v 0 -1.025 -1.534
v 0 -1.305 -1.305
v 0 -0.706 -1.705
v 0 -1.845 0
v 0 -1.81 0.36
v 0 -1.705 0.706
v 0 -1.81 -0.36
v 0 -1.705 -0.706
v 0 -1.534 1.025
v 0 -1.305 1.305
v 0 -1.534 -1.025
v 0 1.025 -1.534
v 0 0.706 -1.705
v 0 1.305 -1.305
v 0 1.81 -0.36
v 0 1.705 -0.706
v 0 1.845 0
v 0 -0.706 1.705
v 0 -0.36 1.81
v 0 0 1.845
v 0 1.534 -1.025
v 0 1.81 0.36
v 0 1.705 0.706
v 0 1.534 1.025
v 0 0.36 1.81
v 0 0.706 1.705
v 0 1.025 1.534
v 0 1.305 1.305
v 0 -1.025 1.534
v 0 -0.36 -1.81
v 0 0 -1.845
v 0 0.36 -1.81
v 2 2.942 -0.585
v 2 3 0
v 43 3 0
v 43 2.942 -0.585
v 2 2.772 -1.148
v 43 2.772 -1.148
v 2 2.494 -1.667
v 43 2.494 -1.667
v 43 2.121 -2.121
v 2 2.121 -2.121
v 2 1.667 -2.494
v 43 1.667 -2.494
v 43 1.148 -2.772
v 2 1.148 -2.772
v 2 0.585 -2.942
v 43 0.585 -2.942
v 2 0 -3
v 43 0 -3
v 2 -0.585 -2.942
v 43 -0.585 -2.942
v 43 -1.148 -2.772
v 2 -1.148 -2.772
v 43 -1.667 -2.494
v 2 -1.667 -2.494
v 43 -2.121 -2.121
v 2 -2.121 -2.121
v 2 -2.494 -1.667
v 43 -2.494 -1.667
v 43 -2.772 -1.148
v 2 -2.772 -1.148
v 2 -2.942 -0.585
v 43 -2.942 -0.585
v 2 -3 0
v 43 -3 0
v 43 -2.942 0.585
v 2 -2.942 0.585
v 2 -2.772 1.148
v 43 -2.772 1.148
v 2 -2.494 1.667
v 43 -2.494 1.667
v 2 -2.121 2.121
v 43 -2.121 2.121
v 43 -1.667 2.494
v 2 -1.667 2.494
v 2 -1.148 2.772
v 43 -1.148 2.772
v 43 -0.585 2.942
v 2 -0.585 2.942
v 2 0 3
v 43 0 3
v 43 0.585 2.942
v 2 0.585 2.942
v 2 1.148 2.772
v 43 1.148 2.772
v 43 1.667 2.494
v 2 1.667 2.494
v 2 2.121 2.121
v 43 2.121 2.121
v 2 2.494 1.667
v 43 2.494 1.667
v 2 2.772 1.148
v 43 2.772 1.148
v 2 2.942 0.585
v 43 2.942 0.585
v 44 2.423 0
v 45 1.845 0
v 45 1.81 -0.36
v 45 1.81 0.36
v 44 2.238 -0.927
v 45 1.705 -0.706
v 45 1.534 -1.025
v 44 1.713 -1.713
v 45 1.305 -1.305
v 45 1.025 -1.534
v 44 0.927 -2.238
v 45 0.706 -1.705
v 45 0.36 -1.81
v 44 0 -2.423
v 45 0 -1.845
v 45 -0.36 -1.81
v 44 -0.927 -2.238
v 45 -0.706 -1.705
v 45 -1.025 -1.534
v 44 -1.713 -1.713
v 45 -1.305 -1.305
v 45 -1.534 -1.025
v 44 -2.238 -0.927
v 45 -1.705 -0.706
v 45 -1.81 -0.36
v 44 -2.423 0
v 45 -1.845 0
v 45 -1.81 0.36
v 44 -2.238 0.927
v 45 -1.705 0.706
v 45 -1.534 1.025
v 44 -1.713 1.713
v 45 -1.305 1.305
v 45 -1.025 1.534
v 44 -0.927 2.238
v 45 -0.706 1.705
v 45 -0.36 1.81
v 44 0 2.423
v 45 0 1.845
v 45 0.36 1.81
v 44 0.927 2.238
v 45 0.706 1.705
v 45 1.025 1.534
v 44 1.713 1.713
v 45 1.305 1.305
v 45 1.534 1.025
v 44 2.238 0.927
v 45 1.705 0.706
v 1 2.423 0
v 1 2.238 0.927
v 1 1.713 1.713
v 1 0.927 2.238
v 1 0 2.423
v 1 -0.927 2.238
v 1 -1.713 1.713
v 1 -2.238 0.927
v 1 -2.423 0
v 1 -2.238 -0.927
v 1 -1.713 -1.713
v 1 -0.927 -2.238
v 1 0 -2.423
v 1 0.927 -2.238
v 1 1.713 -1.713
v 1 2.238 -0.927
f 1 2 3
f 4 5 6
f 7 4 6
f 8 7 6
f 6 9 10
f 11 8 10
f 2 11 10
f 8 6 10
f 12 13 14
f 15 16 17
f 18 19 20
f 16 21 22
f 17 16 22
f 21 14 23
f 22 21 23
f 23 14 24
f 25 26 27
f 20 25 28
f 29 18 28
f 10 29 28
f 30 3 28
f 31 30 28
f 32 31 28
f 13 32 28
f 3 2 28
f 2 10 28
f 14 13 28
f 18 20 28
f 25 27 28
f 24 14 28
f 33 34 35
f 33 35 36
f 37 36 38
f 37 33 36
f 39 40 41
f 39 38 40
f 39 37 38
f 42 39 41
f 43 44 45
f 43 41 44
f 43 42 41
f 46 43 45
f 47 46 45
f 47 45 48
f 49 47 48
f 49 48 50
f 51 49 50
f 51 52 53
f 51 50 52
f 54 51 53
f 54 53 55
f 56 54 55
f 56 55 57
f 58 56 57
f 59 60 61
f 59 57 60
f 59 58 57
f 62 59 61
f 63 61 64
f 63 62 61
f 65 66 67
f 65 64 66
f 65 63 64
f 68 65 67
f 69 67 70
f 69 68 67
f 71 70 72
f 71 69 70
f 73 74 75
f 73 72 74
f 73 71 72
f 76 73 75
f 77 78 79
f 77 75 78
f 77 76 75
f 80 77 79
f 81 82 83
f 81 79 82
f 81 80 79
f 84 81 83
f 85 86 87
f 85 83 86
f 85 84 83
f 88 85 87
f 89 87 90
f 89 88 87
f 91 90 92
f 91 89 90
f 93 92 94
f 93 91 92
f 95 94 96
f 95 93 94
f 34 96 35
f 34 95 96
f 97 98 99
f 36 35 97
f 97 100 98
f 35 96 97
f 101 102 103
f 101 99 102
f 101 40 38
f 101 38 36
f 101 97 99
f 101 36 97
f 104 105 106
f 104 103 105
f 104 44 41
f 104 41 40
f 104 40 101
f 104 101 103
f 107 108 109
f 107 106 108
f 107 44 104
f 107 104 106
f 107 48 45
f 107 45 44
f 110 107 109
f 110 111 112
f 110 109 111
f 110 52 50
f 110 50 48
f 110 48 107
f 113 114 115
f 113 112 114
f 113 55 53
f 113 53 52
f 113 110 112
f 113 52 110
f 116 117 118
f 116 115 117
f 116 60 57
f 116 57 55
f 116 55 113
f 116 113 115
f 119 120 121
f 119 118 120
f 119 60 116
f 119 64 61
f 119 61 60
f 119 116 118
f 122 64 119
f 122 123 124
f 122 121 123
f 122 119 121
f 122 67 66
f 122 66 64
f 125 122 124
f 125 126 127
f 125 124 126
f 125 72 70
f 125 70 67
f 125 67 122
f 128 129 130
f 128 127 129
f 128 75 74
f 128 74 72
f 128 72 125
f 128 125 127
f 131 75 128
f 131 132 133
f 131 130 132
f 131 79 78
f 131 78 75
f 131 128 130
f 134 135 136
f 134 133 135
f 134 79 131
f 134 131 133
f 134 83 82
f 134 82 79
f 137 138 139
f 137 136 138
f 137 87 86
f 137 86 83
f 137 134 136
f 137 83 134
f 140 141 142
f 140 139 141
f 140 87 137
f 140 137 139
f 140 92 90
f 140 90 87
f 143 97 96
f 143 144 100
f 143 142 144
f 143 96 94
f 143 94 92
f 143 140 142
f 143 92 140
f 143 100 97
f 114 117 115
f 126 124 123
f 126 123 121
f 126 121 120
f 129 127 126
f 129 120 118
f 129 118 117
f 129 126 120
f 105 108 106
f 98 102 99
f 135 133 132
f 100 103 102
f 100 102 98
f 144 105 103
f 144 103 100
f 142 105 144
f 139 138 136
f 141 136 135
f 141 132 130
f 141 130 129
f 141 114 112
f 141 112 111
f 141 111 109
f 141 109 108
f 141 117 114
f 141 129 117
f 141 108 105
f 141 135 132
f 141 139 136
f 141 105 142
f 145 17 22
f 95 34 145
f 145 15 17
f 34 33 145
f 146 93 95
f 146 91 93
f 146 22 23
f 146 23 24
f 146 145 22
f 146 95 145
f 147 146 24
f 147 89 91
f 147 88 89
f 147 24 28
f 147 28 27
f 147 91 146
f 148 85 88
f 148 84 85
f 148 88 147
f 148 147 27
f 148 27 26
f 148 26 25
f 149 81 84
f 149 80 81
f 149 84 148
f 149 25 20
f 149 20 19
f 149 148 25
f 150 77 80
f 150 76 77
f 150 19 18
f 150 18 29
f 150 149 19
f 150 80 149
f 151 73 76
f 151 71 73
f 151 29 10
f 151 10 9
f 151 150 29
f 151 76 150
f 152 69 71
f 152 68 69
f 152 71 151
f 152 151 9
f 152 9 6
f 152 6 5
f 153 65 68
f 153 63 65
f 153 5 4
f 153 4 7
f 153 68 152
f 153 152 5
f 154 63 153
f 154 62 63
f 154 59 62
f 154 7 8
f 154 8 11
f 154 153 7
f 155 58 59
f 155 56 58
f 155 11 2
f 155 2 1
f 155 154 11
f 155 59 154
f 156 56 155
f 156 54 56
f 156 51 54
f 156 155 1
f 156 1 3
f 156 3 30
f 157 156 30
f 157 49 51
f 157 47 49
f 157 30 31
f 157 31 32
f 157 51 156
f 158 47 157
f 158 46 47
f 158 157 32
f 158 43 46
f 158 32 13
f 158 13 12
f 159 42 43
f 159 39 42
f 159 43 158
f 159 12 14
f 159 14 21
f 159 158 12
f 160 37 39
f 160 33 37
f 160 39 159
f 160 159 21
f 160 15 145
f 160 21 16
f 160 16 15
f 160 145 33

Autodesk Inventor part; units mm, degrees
ref_plane "YZ Plane" through (0, 0, 0) normal (1, 0, 0) x (0, 1, 0)
ref_plane "XZ Plane" through (0, 0, 0) normal (0, 1, 0) x (-1, 0, 0)
ref_plane "XY Plane" through (0, 0, 0) normal (0, 0, 1) x (1, 0, 0)
sketch "Эскиз" plane through (0, 0, 0) normal (1, 0, 0) x (0, 1, 0)
  circle A0 centre (0, 0) radius 3
  dimension "d1" = 6
extrude "Базовый элемент" add sketch "Эскиз" along normal blind 45
chamfer "Фаска1" distance 2 angle 30 1 edges at (0, -3, 0) measured on face at (15, 2.9612, -0.4812)
chamfer "Эскиз2" distance 2 angle 30 1 edges at (45, -3, 0) measured on face at (30.6667, 2.9903, -0.2414)
equation "\"d1\" = NND"
equation "\"d2\" = NLG"
equation "\"d8\" = PHH"
equation "\"d9\" = FAWI"
equation "\"d12\" = PHH"
equation "\"d4\" = PHH"
equation "\"d5\" = FAWI"
equation "\"d11\" = PHH"
equation "\"NND\" = 6"
equation "\"NLG\" = 45"
equation "\"PHH\" = 2"
equation "\"FAWI\" = 30deg"
equation "\"DIST1\" = 3.2"
equation "\"DIST2\" = DIST1"
equation "\"BOR1\" = 1.6"
equation "\"FAWI2\" = 30deg"
equation "\"BOR2\" = BOR1"
equation "\"PHH2\" = PHH"
properties part number "ISO 2340 - A - 6 x 45" material "Сталь"
